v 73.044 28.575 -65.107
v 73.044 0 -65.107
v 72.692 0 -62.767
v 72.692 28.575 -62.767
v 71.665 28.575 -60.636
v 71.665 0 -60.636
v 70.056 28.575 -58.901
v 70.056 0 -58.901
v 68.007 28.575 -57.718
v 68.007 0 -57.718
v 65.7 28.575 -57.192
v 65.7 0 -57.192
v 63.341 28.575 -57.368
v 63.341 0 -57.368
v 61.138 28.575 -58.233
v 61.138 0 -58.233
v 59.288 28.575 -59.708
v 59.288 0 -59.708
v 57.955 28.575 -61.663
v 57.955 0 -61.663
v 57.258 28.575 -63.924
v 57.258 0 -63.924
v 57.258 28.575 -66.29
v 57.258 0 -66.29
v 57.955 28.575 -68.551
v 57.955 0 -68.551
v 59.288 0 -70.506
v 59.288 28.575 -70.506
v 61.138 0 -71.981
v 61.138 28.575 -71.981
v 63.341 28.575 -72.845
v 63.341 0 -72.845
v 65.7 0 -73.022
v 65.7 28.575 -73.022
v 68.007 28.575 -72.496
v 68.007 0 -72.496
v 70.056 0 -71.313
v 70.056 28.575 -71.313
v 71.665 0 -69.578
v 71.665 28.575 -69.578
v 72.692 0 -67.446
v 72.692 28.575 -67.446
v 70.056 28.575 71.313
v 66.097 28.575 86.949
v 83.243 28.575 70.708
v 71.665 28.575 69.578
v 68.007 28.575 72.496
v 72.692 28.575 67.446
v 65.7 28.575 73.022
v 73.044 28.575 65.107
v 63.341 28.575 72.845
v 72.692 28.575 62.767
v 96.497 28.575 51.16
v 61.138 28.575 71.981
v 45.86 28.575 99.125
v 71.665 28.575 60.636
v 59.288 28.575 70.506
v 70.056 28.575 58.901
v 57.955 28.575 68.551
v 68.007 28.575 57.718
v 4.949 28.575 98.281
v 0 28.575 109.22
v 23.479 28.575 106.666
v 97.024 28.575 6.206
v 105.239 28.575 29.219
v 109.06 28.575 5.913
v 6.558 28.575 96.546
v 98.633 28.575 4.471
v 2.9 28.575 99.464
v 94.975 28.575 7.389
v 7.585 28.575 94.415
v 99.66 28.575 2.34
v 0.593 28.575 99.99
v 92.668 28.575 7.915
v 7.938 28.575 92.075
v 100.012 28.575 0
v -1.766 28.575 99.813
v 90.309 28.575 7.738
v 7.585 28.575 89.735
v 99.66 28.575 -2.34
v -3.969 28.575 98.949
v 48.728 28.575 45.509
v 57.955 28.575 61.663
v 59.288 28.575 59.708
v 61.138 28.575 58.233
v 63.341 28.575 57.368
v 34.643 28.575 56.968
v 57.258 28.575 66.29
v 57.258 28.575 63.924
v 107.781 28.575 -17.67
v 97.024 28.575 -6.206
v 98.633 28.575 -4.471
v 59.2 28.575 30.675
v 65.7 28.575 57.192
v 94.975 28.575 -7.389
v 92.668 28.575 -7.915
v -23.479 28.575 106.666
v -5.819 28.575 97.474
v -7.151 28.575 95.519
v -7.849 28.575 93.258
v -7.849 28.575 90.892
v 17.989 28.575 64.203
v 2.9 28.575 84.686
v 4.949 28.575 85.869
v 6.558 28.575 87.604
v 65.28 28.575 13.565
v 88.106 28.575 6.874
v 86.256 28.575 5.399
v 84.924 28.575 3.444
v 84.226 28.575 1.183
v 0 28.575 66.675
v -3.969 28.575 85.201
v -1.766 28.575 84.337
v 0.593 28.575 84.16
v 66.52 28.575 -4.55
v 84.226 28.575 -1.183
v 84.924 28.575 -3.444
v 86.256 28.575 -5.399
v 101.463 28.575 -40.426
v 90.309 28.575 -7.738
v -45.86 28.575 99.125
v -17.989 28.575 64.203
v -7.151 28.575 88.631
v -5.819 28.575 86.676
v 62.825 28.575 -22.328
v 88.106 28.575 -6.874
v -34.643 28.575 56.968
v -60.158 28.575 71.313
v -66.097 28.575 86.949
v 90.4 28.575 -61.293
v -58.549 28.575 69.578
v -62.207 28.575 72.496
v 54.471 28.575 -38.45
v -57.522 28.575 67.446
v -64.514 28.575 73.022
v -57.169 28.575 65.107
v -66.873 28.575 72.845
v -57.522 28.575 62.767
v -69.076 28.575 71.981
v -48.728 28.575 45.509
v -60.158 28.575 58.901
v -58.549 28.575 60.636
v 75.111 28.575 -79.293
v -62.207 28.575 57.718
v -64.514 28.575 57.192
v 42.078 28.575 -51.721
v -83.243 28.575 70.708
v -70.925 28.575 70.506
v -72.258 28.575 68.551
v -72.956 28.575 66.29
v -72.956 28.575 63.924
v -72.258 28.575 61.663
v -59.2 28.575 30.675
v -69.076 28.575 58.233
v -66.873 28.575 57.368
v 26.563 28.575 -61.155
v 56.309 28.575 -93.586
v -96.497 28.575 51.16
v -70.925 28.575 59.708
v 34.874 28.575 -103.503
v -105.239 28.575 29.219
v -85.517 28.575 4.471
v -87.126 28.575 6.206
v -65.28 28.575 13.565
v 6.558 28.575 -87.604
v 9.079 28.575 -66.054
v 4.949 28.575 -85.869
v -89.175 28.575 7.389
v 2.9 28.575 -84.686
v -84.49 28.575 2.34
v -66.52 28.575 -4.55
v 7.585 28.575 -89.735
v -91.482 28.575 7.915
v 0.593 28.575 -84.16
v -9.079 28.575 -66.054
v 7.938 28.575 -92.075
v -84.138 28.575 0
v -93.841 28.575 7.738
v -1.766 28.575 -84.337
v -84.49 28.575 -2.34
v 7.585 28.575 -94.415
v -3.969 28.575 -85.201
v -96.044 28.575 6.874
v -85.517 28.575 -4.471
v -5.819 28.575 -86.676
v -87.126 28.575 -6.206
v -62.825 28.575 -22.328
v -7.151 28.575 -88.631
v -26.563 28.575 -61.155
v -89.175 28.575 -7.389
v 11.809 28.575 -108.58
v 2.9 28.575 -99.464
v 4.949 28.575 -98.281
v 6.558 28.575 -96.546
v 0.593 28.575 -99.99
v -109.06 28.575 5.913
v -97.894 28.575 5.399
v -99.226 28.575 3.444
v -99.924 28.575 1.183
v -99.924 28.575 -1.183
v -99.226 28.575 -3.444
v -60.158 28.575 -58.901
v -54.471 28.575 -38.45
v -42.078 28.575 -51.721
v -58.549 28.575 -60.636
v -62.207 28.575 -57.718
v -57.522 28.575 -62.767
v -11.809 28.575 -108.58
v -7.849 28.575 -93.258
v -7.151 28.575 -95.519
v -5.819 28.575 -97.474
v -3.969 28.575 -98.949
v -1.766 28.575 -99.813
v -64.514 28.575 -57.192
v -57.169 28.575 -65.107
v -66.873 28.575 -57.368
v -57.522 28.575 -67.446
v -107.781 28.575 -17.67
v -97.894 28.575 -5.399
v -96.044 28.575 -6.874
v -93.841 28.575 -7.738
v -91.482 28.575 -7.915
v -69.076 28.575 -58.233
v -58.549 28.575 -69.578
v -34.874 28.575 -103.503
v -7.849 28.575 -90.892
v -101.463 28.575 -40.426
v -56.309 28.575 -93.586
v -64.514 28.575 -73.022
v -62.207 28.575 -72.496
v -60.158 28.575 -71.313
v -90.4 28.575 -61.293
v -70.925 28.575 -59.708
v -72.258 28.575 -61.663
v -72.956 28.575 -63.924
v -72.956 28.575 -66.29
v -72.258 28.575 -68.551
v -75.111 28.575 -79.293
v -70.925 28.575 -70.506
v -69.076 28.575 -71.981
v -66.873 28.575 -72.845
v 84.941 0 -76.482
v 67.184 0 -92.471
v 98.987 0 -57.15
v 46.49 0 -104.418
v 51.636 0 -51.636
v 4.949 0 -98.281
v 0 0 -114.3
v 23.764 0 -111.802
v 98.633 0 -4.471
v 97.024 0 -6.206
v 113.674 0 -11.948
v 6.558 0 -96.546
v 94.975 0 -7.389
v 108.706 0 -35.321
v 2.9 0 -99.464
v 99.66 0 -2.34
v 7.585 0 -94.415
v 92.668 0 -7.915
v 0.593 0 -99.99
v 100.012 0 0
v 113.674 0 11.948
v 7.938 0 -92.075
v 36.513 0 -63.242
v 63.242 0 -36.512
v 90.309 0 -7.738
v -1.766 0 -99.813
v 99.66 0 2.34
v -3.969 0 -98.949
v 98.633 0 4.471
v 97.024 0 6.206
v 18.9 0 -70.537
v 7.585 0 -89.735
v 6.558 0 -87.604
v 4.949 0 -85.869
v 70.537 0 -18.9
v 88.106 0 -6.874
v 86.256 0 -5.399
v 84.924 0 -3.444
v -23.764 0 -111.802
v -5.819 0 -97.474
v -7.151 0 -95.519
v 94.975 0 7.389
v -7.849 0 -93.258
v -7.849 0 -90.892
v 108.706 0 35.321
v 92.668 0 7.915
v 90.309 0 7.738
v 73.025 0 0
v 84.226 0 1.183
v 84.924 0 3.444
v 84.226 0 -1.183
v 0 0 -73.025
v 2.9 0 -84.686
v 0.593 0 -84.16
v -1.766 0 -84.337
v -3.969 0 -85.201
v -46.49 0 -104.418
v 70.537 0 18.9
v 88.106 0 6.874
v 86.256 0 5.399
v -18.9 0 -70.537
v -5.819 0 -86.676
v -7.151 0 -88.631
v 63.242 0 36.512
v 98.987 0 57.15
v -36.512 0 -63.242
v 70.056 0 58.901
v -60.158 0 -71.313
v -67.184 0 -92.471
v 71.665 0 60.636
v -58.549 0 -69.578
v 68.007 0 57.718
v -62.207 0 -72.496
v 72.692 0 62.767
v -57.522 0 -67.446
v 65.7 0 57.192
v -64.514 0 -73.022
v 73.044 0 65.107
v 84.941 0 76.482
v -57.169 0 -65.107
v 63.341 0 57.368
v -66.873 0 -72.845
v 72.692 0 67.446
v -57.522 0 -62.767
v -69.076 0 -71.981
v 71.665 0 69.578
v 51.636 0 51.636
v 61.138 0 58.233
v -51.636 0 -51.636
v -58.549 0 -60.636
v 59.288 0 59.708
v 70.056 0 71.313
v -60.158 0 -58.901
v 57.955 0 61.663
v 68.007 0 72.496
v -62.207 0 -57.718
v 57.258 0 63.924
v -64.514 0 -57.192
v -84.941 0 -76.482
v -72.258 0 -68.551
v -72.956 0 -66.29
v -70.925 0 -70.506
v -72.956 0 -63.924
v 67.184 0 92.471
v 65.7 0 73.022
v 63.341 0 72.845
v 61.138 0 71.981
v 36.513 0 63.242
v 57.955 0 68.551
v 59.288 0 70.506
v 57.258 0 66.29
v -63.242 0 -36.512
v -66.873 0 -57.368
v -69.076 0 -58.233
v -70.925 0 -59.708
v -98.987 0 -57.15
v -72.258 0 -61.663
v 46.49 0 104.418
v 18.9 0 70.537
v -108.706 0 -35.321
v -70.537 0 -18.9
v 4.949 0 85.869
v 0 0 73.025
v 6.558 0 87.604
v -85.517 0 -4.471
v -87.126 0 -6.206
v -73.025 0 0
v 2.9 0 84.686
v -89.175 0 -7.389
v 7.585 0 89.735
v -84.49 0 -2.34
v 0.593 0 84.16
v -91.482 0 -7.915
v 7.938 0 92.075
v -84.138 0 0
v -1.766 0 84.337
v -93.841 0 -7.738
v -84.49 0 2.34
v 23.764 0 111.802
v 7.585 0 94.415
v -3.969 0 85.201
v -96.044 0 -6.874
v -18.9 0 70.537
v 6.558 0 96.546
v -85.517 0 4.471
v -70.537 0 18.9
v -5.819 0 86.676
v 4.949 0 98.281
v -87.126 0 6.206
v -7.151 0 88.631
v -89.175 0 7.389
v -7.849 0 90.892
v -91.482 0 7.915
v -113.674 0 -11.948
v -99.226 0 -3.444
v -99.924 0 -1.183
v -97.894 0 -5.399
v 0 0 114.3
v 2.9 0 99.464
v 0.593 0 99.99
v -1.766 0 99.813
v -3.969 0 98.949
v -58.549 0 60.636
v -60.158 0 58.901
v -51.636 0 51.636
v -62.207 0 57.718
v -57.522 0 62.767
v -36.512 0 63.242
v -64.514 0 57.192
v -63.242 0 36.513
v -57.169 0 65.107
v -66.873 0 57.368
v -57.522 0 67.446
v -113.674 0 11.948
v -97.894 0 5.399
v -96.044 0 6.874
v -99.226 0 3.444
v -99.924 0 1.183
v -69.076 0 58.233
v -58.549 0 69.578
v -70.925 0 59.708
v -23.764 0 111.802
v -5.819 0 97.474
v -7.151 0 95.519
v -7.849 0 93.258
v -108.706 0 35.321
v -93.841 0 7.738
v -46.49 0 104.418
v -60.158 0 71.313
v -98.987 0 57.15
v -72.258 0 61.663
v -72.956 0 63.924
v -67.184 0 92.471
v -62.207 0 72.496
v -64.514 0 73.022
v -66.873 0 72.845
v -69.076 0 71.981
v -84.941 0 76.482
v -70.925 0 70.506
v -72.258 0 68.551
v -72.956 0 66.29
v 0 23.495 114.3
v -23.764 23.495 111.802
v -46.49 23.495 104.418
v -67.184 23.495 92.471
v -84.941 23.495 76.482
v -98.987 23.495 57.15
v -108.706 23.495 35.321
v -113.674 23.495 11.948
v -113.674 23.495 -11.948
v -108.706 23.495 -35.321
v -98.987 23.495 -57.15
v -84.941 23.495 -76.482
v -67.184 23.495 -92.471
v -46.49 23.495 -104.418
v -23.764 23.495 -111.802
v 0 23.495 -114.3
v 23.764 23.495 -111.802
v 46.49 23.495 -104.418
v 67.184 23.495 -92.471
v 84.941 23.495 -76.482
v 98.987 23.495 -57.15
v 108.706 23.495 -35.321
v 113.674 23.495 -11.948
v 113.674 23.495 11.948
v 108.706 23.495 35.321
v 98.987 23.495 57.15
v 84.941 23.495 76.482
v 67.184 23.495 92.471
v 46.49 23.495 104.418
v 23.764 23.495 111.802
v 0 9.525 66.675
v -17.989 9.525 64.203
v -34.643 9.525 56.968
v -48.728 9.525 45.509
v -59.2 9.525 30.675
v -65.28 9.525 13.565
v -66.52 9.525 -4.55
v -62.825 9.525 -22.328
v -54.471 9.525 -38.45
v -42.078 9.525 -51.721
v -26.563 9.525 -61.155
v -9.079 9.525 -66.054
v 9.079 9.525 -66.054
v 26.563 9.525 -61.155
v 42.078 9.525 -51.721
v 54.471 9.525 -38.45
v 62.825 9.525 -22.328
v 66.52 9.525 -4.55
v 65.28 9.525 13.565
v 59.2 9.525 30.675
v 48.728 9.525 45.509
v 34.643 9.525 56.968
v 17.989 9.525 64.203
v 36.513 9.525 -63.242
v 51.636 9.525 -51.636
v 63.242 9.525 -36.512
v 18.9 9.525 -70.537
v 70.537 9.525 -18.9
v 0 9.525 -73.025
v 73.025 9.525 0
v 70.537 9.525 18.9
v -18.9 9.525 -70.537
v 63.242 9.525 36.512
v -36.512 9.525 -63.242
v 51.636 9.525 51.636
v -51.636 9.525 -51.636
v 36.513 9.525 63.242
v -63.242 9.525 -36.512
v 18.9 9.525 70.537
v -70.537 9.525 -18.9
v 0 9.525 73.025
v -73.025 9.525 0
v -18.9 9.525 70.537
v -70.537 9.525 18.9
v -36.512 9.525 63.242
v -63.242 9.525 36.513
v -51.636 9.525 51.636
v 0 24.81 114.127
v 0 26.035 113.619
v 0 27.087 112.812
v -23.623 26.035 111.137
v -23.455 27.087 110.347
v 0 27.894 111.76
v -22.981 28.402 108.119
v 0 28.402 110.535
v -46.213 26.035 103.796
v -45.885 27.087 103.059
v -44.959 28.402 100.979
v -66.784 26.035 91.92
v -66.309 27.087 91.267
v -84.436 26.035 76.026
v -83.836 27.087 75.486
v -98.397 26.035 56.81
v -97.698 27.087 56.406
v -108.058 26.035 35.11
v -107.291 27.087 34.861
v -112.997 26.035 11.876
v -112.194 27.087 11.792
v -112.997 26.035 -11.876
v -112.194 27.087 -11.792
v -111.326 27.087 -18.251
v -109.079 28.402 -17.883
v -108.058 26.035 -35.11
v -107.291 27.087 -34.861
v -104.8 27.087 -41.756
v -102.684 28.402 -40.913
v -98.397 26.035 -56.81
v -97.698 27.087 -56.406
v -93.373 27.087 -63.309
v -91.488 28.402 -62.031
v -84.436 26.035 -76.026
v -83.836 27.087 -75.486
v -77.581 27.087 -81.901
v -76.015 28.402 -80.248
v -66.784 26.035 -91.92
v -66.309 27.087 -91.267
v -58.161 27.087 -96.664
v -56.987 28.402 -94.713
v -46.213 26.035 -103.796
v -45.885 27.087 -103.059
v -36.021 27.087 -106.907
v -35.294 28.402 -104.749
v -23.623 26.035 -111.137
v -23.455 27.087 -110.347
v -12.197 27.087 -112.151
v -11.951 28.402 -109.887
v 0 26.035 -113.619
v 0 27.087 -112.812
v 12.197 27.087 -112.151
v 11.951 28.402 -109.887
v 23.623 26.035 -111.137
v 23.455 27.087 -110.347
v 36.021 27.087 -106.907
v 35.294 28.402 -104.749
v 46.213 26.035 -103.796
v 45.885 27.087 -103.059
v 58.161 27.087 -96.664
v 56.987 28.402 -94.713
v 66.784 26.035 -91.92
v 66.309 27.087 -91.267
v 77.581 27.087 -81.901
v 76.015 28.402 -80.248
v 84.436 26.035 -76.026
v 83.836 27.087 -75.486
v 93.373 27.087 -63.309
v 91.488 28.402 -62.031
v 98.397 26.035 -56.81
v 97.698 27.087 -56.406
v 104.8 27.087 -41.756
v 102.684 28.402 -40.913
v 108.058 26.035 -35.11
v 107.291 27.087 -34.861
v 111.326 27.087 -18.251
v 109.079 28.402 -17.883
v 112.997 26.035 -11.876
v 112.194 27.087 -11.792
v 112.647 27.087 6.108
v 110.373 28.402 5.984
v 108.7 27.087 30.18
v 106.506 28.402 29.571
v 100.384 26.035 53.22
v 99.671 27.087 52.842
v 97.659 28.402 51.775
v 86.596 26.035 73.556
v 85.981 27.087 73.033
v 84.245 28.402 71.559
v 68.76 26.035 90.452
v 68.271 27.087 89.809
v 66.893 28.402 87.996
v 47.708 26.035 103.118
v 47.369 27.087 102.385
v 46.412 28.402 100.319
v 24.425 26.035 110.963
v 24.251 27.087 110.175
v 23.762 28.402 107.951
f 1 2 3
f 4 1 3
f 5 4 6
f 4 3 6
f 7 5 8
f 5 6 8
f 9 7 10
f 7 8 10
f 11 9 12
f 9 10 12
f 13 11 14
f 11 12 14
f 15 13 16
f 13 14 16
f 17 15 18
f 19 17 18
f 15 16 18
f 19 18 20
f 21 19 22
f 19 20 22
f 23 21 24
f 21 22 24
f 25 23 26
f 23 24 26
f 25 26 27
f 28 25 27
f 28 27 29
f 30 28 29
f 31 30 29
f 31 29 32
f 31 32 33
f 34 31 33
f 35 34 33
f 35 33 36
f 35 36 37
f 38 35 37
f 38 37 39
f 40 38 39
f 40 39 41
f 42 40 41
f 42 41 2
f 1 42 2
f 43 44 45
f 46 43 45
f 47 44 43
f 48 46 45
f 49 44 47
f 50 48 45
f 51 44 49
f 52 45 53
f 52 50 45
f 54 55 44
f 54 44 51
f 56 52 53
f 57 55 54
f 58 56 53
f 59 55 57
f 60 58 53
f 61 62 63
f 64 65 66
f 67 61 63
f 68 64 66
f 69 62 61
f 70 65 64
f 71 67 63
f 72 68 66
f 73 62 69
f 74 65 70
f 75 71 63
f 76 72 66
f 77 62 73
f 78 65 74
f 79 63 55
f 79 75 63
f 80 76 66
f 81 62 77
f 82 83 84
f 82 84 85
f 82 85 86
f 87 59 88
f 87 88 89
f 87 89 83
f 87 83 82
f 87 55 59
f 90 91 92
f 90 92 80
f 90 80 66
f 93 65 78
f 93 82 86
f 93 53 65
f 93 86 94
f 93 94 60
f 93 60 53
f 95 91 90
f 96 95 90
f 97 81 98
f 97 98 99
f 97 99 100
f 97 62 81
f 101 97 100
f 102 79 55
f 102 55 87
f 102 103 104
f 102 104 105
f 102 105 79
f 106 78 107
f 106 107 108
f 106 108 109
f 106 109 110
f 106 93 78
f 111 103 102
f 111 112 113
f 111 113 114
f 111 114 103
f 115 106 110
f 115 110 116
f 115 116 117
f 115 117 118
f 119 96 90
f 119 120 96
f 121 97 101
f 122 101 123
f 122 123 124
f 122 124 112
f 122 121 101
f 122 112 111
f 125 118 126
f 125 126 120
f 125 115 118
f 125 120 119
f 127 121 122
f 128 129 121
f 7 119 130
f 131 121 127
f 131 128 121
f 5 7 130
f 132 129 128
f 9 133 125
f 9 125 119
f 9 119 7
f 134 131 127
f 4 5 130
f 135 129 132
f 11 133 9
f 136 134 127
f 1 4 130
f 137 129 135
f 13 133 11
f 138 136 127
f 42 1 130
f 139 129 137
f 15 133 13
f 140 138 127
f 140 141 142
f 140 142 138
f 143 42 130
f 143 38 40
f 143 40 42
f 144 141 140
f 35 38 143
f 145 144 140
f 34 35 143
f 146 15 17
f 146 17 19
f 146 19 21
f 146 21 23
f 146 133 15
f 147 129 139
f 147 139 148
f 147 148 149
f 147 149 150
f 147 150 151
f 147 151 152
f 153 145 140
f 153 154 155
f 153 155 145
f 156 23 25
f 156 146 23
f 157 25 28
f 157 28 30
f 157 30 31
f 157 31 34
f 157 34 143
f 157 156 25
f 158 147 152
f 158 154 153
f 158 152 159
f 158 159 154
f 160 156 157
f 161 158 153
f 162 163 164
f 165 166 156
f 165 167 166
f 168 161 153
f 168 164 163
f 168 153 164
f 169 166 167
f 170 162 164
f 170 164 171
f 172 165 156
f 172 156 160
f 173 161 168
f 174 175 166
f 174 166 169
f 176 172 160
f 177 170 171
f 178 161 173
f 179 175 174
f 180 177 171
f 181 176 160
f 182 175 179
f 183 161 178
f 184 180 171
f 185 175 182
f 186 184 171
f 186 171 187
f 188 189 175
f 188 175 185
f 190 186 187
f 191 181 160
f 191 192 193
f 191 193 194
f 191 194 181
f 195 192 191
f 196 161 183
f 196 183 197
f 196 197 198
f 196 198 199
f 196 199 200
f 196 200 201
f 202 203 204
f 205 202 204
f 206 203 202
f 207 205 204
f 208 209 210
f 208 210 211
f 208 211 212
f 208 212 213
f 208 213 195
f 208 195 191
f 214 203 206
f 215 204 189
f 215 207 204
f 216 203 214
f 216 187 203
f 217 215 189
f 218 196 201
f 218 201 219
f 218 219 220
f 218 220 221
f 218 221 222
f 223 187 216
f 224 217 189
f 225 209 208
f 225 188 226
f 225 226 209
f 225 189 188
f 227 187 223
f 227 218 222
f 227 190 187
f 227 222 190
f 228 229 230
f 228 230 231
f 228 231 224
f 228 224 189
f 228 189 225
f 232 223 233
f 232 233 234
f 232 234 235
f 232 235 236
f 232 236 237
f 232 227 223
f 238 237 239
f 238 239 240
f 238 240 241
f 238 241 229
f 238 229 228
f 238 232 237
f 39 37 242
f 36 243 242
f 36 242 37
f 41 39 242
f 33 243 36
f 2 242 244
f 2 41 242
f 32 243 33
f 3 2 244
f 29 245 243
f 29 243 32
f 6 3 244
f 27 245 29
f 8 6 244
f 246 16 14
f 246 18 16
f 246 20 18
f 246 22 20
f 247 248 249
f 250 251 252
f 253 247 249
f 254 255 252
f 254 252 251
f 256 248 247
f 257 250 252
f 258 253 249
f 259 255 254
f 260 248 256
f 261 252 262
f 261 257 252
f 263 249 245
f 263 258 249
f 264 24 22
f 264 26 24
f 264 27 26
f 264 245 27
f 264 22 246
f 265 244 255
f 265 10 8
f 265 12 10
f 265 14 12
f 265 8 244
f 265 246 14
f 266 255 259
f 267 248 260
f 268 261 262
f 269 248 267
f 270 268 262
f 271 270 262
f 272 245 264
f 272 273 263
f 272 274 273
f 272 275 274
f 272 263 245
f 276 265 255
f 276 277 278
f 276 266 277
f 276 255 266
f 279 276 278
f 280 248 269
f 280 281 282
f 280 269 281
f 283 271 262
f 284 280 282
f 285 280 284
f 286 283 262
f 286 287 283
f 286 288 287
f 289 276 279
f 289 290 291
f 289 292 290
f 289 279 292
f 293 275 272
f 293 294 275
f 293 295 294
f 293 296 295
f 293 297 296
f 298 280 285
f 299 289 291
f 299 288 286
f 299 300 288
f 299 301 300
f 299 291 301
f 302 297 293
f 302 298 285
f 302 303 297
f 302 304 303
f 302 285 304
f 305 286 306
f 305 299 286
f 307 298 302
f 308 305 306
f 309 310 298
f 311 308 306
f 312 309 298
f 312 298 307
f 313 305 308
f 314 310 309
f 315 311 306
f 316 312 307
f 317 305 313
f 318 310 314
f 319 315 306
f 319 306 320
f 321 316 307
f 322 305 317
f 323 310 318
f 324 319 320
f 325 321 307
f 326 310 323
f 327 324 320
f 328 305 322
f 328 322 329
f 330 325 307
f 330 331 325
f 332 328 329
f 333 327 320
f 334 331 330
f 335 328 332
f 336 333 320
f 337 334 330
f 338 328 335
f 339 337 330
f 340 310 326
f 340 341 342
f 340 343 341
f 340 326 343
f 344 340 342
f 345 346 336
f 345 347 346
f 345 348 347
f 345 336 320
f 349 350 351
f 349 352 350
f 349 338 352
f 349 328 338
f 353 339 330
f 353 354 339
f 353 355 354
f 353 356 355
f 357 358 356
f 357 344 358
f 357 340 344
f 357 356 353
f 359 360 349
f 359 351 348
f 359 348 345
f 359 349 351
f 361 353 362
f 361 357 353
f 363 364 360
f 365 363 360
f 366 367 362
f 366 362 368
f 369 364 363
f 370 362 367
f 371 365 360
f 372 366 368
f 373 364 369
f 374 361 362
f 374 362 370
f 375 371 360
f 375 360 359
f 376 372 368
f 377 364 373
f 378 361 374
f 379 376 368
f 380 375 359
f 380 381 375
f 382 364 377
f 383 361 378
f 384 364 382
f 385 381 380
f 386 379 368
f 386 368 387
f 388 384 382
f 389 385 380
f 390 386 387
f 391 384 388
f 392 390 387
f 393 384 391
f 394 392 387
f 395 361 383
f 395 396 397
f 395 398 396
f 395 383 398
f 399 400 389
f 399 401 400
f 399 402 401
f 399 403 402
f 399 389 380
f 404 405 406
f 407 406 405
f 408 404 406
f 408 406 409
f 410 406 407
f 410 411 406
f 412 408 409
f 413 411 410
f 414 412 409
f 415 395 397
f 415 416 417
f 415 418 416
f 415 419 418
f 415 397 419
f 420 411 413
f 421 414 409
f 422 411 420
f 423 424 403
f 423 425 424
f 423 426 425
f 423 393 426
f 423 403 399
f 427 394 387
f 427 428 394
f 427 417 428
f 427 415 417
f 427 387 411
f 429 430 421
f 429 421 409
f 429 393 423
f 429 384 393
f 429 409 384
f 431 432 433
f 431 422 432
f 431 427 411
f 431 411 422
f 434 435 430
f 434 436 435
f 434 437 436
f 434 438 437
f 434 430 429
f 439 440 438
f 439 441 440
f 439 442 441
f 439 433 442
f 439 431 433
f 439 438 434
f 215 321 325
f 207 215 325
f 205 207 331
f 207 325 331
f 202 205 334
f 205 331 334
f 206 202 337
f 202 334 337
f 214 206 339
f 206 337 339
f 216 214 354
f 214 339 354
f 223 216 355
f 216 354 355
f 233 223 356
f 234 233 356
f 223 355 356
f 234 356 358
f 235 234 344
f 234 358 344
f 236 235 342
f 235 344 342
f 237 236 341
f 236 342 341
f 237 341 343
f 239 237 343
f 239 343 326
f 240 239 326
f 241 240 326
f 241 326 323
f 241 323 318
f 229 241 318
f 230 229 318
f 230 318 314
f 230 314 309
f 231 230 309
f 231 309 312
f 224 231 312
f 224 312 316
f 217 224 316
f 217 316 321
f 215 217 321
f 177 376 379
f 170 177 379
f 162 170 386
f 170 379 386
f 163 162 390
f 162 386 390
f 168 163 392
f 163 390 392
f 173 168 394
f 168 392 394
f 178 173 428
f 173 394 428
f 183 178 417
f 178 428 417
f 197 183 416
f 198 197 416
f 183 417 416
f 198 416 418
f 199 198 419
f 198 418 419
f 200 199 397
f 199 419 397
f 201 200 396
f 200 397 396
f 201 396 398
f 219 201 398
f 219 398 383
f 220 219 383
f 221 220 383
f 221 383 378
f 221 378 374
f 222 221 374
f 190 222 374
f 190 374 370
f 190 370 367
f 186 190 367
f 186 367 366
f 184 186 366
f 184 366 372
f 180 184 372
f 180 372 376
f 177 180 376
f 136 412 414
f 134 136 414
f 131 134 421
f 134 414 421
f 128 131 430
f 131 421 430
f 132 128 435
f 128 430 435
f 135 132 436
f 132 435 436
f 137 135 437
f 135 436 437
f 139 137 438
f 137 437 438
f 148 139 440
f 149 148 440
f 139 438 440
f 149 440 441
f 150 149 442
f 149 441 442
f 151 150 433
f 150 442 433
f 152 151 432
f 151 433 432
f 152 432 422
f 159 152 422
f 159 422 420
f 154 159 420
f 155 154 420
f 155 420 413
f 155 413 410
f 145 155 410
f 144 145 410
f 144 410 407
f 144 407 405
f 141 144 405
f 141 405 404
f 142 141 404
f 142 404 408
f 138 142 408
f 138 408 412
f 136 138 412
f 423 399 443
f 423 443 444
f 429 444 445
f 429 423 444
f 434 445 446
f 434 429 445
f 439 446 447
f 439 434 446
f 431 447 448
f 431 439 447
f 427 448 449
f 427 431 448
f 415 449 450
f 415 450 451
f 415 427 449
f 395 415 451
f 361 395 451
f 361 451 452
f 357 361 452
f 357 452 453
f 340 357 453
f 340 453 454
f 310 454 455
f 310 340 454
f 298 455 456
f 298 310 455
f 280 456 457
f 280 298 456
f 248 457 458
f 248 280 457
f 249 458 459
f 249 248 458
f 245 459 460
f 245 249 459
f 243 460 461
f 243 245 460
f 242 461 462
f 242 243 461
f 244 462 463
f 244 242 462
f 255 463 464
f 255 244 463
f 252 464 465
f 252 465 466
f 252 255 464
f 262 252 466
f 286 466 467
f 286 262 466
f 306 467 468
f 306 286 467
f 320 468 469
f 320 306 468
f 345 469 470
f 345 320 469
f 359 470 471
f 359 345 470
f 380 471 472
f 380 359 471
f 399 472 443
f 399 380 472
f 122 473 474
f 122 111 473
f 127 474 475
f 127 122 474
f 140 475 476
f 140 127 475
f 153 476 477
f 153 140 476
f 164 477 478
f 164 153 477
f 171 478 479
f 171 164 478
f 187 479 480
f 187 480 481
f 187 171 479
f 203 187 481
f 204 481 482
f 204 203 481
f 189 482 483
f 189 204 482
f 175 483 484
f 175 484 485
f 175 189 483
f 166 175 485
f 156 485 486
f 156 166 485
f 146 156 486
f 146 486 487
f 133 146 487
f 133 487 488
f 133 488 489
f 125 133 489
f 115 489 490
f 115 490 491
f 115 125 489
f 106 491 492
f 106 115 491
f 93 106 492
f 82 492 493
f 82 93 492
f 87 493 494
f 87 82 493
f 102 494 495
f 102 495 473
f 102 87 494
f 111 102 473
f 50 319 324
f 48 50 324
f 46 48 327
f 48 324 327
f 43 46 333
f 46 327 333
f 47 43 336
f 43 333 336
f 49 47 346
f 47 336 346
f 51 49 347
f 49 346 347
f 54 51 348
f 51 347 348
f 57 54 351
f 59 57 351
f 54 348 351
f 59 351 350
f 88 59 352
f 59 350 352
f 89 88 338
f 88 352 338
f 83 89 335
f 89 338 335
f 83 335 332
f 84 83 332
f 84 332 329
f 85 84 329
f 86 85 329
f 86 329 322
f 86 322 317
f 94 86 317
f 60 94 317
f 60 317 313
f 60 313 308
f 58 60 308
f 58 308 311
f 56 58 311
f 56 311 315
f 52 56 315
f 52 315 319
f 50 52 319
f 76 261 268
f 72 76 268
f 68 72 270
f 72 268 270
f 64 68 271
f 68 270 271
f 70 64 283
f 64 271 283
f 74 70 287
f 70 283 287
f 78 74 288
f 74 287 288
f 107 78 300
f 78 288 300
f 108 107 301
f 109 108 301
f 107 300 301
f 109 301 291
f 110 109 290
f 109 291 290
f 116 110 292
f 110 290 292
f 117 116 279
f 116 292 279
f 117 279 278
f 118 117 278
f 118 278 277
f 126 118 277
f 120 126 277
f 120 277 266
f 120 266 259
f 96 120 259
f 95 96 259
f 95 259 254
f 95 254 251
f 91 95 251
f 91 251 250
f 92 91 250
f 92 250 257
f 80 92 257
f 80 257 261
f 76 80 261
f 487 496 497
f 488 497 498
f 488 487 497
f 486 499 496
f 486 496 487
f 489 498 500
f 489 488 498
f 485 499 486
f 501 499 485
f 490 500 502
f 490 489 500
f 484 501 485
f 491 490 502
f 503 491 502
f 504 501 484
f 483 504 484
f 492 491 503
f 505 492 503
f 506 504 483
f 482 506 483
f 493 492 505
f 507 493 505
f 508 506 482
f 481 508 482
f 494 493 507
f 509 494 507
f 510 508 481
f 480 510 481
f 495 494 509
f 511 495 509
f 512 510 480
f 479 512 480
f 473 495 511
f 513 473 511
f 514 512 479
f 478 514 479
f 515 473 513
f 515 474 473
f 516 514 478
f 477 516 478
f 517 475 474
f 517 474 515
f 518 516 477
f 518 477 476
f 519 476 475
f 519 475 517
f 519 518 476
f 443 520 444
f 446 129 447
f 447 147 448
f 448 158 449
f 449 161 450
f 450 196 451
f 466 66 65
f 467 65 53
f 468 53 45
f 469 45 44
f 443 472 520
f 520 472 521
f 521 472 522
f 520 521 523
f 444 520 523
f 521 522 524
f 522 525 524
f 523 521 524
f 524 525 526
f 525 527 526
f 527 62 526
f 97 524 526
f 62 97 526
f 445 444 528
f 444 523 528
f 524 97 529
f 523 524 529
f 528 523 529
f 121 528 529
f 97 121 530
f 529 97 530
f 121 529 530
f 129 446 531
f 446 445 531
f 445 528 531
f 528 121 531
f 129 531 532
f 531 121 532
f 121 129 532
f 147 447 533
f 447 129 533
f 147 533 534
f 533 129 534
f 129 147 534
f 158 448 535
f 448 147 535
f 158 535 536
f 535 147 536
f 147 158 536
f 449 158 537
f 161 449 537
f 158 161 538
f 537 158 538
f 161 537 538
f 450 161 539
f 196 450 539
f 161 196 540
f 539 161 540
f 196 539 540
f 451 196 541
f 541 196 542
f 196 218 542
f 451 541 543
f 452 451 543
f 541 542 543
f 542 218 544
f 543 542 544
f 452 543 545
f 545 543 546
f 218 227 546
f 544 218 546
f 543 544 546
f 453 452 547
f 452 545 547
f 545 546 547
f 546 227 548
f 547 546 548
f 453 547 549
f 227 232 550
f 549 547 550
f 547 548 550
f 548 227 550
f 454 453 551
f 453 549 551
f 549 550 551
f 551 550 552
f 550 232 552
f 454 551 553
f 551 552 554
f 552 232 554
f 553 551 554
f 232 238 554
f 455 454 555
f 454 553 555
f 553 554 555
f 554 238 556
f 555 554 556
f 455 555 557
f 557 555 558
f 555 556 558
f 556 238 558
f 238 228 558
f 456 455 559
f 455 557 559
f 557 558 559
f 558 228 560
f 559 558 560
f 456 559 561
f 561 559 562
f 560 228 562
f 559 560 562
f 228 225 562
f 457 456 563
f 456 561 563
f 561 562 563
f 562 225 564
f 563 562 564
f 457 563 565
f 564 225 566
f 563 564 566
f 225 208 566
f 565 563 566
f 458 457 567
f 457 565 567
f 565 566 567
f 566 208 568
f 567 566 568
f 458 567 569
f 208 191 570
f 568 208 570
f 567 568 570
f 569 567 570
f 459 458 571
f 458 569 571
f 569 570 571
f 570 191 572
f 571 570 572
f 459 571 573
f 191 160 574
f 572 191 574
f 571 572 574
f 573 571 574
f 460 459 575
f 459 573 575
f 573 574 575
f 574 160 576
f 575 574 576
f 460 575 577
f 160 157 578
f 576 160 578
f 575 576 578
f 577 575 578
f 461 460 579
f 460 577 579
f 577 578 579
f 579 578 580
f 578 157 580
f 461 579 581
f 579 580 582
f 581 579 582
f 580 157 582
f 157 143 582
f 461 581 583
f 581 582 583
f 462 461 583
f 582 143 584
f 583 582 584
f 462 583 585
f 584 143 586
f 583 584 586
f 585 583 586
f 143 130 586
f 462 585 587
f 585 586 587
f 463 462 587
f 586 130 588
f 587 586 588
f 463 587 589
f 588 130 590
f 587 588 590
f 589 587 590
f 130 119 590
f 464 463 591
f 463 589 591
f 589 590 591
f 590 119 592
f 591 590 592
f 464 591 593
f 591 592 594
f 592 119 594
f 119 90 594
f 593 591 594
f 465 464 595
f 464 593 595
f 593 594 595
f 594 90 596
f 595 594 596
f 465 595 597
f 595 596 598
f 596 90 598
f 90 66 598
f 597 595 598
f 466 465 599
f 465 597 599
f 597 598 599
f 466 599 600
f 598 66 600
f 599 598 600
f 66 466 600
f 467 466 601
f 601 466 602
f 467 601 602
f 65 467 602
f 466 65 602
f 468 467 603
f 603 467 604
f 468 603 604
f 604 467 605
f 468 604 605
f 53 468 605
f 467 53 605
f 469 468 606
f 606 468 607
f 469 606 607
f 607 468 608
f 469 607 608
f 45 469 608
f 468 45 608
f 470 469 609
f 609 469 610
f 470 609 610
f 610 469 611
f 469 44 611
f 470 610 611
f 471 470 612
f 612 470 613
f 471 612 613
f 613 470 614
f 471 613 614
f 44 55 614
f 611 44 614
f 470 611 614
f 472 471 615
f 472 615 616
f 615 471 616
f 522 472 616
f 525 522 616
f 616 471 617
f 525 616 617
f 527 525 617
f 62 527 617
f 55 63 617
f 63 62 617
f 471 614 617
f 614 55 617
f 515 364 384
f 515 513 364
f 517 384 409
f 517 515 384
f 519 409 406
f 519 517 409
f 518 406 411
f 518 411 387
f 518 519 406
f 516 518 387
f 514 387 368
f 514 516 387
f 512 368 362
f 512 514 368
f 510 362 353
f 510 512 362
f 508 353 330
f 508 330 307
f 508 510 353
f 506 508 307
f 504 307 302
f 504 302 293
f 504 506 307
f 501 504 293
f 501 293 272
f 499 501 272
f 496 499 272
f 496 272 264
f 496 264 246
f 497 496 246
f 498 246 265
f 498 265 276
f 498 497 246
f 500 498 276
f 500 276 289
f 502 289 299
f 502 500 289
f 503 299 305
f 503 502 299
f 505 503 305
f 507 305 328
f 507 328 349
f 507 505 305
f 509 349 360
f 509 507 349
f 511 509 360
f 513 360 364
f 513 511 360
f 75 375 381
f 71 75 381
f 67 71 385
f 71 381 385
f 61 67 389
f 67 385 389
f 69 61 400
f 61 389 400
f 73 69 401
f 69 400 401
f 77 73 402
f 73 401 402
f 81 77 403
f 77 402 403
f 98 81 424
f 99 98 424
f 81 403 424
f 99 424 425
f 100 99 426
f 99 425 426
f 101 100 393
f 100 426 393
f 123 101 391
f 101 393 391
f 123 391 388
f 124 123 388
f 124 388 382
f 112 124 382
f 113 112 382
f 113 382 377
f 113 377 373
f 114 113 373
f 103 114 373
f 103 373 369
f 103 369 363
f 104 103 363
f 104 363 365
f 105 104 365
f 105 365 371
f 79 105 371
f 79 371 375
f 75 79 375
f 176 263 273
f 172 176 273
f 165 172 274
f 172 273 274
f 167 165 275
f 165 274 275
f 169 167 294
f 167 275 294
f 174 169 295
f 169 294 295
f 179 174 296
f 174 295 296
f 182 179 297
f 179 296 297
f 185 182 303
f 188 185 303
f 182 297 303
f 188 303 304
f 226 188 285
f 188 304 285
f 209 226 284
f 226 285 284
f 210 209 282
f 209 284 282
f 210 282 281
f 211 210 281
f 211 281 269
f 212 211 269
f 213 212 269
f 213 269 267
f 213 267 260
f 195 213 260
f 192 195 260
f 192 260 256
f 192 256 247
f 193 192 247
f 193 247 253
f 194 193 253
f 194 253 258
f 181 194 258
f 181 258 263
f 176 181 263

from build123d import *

# Parameters (mm, degrees)
F2_R     = 7.9375
F3_DEPTH = 28.576
F4_R     = 5.08


with BuildPart() as f1:
    # F0 (on Right) → F1 (revolve)
    with BuildSketch(Plane.YZ):
        Polygon((28.575, 114.3), (0, 114.3), (0, 73.025), (9.525, 73.025), (9.525, 66.675), (28.575, 66.675), align=None)
    revolve(axis=Axis((0, 0.501314, 0), (0, -1, 0)))

    # F2 (on face) → F3 (cut, through all)
    with BuildSketch(Plane.XZ):
        with Locations((0, 92.075)):
            Circle(F2_R)
        with Locations((-65.106857, 65.106857)):
            Circle(F2_R)
        with Locations((-92.075, 0)):
            Circle(F2_R)
        with Locations((-65.106857, -65.106857)):
            Circle(F2_R)
        with Locations((0, -92.075)):
            Circle(F2_R)
        with Locations((65.106857, -65.106857)):
            Circle(F2_R)
        with Locations((92.075, 0)):
            Circle(F2_R)
        with Locations((65.106857, 65.106857)):
            Circle(F2_R)
    extrude(amount=-F3_DEPTH, mode=Mode.SUBTRACT)

    # F4
    f4_edges = [f1.edges().sort_by_distance(p)[0] for p in [
        (0, 28.575, -114.3),
    ]]
    fillet(f4_edges, radius=F4_R)


solid = f1.part
